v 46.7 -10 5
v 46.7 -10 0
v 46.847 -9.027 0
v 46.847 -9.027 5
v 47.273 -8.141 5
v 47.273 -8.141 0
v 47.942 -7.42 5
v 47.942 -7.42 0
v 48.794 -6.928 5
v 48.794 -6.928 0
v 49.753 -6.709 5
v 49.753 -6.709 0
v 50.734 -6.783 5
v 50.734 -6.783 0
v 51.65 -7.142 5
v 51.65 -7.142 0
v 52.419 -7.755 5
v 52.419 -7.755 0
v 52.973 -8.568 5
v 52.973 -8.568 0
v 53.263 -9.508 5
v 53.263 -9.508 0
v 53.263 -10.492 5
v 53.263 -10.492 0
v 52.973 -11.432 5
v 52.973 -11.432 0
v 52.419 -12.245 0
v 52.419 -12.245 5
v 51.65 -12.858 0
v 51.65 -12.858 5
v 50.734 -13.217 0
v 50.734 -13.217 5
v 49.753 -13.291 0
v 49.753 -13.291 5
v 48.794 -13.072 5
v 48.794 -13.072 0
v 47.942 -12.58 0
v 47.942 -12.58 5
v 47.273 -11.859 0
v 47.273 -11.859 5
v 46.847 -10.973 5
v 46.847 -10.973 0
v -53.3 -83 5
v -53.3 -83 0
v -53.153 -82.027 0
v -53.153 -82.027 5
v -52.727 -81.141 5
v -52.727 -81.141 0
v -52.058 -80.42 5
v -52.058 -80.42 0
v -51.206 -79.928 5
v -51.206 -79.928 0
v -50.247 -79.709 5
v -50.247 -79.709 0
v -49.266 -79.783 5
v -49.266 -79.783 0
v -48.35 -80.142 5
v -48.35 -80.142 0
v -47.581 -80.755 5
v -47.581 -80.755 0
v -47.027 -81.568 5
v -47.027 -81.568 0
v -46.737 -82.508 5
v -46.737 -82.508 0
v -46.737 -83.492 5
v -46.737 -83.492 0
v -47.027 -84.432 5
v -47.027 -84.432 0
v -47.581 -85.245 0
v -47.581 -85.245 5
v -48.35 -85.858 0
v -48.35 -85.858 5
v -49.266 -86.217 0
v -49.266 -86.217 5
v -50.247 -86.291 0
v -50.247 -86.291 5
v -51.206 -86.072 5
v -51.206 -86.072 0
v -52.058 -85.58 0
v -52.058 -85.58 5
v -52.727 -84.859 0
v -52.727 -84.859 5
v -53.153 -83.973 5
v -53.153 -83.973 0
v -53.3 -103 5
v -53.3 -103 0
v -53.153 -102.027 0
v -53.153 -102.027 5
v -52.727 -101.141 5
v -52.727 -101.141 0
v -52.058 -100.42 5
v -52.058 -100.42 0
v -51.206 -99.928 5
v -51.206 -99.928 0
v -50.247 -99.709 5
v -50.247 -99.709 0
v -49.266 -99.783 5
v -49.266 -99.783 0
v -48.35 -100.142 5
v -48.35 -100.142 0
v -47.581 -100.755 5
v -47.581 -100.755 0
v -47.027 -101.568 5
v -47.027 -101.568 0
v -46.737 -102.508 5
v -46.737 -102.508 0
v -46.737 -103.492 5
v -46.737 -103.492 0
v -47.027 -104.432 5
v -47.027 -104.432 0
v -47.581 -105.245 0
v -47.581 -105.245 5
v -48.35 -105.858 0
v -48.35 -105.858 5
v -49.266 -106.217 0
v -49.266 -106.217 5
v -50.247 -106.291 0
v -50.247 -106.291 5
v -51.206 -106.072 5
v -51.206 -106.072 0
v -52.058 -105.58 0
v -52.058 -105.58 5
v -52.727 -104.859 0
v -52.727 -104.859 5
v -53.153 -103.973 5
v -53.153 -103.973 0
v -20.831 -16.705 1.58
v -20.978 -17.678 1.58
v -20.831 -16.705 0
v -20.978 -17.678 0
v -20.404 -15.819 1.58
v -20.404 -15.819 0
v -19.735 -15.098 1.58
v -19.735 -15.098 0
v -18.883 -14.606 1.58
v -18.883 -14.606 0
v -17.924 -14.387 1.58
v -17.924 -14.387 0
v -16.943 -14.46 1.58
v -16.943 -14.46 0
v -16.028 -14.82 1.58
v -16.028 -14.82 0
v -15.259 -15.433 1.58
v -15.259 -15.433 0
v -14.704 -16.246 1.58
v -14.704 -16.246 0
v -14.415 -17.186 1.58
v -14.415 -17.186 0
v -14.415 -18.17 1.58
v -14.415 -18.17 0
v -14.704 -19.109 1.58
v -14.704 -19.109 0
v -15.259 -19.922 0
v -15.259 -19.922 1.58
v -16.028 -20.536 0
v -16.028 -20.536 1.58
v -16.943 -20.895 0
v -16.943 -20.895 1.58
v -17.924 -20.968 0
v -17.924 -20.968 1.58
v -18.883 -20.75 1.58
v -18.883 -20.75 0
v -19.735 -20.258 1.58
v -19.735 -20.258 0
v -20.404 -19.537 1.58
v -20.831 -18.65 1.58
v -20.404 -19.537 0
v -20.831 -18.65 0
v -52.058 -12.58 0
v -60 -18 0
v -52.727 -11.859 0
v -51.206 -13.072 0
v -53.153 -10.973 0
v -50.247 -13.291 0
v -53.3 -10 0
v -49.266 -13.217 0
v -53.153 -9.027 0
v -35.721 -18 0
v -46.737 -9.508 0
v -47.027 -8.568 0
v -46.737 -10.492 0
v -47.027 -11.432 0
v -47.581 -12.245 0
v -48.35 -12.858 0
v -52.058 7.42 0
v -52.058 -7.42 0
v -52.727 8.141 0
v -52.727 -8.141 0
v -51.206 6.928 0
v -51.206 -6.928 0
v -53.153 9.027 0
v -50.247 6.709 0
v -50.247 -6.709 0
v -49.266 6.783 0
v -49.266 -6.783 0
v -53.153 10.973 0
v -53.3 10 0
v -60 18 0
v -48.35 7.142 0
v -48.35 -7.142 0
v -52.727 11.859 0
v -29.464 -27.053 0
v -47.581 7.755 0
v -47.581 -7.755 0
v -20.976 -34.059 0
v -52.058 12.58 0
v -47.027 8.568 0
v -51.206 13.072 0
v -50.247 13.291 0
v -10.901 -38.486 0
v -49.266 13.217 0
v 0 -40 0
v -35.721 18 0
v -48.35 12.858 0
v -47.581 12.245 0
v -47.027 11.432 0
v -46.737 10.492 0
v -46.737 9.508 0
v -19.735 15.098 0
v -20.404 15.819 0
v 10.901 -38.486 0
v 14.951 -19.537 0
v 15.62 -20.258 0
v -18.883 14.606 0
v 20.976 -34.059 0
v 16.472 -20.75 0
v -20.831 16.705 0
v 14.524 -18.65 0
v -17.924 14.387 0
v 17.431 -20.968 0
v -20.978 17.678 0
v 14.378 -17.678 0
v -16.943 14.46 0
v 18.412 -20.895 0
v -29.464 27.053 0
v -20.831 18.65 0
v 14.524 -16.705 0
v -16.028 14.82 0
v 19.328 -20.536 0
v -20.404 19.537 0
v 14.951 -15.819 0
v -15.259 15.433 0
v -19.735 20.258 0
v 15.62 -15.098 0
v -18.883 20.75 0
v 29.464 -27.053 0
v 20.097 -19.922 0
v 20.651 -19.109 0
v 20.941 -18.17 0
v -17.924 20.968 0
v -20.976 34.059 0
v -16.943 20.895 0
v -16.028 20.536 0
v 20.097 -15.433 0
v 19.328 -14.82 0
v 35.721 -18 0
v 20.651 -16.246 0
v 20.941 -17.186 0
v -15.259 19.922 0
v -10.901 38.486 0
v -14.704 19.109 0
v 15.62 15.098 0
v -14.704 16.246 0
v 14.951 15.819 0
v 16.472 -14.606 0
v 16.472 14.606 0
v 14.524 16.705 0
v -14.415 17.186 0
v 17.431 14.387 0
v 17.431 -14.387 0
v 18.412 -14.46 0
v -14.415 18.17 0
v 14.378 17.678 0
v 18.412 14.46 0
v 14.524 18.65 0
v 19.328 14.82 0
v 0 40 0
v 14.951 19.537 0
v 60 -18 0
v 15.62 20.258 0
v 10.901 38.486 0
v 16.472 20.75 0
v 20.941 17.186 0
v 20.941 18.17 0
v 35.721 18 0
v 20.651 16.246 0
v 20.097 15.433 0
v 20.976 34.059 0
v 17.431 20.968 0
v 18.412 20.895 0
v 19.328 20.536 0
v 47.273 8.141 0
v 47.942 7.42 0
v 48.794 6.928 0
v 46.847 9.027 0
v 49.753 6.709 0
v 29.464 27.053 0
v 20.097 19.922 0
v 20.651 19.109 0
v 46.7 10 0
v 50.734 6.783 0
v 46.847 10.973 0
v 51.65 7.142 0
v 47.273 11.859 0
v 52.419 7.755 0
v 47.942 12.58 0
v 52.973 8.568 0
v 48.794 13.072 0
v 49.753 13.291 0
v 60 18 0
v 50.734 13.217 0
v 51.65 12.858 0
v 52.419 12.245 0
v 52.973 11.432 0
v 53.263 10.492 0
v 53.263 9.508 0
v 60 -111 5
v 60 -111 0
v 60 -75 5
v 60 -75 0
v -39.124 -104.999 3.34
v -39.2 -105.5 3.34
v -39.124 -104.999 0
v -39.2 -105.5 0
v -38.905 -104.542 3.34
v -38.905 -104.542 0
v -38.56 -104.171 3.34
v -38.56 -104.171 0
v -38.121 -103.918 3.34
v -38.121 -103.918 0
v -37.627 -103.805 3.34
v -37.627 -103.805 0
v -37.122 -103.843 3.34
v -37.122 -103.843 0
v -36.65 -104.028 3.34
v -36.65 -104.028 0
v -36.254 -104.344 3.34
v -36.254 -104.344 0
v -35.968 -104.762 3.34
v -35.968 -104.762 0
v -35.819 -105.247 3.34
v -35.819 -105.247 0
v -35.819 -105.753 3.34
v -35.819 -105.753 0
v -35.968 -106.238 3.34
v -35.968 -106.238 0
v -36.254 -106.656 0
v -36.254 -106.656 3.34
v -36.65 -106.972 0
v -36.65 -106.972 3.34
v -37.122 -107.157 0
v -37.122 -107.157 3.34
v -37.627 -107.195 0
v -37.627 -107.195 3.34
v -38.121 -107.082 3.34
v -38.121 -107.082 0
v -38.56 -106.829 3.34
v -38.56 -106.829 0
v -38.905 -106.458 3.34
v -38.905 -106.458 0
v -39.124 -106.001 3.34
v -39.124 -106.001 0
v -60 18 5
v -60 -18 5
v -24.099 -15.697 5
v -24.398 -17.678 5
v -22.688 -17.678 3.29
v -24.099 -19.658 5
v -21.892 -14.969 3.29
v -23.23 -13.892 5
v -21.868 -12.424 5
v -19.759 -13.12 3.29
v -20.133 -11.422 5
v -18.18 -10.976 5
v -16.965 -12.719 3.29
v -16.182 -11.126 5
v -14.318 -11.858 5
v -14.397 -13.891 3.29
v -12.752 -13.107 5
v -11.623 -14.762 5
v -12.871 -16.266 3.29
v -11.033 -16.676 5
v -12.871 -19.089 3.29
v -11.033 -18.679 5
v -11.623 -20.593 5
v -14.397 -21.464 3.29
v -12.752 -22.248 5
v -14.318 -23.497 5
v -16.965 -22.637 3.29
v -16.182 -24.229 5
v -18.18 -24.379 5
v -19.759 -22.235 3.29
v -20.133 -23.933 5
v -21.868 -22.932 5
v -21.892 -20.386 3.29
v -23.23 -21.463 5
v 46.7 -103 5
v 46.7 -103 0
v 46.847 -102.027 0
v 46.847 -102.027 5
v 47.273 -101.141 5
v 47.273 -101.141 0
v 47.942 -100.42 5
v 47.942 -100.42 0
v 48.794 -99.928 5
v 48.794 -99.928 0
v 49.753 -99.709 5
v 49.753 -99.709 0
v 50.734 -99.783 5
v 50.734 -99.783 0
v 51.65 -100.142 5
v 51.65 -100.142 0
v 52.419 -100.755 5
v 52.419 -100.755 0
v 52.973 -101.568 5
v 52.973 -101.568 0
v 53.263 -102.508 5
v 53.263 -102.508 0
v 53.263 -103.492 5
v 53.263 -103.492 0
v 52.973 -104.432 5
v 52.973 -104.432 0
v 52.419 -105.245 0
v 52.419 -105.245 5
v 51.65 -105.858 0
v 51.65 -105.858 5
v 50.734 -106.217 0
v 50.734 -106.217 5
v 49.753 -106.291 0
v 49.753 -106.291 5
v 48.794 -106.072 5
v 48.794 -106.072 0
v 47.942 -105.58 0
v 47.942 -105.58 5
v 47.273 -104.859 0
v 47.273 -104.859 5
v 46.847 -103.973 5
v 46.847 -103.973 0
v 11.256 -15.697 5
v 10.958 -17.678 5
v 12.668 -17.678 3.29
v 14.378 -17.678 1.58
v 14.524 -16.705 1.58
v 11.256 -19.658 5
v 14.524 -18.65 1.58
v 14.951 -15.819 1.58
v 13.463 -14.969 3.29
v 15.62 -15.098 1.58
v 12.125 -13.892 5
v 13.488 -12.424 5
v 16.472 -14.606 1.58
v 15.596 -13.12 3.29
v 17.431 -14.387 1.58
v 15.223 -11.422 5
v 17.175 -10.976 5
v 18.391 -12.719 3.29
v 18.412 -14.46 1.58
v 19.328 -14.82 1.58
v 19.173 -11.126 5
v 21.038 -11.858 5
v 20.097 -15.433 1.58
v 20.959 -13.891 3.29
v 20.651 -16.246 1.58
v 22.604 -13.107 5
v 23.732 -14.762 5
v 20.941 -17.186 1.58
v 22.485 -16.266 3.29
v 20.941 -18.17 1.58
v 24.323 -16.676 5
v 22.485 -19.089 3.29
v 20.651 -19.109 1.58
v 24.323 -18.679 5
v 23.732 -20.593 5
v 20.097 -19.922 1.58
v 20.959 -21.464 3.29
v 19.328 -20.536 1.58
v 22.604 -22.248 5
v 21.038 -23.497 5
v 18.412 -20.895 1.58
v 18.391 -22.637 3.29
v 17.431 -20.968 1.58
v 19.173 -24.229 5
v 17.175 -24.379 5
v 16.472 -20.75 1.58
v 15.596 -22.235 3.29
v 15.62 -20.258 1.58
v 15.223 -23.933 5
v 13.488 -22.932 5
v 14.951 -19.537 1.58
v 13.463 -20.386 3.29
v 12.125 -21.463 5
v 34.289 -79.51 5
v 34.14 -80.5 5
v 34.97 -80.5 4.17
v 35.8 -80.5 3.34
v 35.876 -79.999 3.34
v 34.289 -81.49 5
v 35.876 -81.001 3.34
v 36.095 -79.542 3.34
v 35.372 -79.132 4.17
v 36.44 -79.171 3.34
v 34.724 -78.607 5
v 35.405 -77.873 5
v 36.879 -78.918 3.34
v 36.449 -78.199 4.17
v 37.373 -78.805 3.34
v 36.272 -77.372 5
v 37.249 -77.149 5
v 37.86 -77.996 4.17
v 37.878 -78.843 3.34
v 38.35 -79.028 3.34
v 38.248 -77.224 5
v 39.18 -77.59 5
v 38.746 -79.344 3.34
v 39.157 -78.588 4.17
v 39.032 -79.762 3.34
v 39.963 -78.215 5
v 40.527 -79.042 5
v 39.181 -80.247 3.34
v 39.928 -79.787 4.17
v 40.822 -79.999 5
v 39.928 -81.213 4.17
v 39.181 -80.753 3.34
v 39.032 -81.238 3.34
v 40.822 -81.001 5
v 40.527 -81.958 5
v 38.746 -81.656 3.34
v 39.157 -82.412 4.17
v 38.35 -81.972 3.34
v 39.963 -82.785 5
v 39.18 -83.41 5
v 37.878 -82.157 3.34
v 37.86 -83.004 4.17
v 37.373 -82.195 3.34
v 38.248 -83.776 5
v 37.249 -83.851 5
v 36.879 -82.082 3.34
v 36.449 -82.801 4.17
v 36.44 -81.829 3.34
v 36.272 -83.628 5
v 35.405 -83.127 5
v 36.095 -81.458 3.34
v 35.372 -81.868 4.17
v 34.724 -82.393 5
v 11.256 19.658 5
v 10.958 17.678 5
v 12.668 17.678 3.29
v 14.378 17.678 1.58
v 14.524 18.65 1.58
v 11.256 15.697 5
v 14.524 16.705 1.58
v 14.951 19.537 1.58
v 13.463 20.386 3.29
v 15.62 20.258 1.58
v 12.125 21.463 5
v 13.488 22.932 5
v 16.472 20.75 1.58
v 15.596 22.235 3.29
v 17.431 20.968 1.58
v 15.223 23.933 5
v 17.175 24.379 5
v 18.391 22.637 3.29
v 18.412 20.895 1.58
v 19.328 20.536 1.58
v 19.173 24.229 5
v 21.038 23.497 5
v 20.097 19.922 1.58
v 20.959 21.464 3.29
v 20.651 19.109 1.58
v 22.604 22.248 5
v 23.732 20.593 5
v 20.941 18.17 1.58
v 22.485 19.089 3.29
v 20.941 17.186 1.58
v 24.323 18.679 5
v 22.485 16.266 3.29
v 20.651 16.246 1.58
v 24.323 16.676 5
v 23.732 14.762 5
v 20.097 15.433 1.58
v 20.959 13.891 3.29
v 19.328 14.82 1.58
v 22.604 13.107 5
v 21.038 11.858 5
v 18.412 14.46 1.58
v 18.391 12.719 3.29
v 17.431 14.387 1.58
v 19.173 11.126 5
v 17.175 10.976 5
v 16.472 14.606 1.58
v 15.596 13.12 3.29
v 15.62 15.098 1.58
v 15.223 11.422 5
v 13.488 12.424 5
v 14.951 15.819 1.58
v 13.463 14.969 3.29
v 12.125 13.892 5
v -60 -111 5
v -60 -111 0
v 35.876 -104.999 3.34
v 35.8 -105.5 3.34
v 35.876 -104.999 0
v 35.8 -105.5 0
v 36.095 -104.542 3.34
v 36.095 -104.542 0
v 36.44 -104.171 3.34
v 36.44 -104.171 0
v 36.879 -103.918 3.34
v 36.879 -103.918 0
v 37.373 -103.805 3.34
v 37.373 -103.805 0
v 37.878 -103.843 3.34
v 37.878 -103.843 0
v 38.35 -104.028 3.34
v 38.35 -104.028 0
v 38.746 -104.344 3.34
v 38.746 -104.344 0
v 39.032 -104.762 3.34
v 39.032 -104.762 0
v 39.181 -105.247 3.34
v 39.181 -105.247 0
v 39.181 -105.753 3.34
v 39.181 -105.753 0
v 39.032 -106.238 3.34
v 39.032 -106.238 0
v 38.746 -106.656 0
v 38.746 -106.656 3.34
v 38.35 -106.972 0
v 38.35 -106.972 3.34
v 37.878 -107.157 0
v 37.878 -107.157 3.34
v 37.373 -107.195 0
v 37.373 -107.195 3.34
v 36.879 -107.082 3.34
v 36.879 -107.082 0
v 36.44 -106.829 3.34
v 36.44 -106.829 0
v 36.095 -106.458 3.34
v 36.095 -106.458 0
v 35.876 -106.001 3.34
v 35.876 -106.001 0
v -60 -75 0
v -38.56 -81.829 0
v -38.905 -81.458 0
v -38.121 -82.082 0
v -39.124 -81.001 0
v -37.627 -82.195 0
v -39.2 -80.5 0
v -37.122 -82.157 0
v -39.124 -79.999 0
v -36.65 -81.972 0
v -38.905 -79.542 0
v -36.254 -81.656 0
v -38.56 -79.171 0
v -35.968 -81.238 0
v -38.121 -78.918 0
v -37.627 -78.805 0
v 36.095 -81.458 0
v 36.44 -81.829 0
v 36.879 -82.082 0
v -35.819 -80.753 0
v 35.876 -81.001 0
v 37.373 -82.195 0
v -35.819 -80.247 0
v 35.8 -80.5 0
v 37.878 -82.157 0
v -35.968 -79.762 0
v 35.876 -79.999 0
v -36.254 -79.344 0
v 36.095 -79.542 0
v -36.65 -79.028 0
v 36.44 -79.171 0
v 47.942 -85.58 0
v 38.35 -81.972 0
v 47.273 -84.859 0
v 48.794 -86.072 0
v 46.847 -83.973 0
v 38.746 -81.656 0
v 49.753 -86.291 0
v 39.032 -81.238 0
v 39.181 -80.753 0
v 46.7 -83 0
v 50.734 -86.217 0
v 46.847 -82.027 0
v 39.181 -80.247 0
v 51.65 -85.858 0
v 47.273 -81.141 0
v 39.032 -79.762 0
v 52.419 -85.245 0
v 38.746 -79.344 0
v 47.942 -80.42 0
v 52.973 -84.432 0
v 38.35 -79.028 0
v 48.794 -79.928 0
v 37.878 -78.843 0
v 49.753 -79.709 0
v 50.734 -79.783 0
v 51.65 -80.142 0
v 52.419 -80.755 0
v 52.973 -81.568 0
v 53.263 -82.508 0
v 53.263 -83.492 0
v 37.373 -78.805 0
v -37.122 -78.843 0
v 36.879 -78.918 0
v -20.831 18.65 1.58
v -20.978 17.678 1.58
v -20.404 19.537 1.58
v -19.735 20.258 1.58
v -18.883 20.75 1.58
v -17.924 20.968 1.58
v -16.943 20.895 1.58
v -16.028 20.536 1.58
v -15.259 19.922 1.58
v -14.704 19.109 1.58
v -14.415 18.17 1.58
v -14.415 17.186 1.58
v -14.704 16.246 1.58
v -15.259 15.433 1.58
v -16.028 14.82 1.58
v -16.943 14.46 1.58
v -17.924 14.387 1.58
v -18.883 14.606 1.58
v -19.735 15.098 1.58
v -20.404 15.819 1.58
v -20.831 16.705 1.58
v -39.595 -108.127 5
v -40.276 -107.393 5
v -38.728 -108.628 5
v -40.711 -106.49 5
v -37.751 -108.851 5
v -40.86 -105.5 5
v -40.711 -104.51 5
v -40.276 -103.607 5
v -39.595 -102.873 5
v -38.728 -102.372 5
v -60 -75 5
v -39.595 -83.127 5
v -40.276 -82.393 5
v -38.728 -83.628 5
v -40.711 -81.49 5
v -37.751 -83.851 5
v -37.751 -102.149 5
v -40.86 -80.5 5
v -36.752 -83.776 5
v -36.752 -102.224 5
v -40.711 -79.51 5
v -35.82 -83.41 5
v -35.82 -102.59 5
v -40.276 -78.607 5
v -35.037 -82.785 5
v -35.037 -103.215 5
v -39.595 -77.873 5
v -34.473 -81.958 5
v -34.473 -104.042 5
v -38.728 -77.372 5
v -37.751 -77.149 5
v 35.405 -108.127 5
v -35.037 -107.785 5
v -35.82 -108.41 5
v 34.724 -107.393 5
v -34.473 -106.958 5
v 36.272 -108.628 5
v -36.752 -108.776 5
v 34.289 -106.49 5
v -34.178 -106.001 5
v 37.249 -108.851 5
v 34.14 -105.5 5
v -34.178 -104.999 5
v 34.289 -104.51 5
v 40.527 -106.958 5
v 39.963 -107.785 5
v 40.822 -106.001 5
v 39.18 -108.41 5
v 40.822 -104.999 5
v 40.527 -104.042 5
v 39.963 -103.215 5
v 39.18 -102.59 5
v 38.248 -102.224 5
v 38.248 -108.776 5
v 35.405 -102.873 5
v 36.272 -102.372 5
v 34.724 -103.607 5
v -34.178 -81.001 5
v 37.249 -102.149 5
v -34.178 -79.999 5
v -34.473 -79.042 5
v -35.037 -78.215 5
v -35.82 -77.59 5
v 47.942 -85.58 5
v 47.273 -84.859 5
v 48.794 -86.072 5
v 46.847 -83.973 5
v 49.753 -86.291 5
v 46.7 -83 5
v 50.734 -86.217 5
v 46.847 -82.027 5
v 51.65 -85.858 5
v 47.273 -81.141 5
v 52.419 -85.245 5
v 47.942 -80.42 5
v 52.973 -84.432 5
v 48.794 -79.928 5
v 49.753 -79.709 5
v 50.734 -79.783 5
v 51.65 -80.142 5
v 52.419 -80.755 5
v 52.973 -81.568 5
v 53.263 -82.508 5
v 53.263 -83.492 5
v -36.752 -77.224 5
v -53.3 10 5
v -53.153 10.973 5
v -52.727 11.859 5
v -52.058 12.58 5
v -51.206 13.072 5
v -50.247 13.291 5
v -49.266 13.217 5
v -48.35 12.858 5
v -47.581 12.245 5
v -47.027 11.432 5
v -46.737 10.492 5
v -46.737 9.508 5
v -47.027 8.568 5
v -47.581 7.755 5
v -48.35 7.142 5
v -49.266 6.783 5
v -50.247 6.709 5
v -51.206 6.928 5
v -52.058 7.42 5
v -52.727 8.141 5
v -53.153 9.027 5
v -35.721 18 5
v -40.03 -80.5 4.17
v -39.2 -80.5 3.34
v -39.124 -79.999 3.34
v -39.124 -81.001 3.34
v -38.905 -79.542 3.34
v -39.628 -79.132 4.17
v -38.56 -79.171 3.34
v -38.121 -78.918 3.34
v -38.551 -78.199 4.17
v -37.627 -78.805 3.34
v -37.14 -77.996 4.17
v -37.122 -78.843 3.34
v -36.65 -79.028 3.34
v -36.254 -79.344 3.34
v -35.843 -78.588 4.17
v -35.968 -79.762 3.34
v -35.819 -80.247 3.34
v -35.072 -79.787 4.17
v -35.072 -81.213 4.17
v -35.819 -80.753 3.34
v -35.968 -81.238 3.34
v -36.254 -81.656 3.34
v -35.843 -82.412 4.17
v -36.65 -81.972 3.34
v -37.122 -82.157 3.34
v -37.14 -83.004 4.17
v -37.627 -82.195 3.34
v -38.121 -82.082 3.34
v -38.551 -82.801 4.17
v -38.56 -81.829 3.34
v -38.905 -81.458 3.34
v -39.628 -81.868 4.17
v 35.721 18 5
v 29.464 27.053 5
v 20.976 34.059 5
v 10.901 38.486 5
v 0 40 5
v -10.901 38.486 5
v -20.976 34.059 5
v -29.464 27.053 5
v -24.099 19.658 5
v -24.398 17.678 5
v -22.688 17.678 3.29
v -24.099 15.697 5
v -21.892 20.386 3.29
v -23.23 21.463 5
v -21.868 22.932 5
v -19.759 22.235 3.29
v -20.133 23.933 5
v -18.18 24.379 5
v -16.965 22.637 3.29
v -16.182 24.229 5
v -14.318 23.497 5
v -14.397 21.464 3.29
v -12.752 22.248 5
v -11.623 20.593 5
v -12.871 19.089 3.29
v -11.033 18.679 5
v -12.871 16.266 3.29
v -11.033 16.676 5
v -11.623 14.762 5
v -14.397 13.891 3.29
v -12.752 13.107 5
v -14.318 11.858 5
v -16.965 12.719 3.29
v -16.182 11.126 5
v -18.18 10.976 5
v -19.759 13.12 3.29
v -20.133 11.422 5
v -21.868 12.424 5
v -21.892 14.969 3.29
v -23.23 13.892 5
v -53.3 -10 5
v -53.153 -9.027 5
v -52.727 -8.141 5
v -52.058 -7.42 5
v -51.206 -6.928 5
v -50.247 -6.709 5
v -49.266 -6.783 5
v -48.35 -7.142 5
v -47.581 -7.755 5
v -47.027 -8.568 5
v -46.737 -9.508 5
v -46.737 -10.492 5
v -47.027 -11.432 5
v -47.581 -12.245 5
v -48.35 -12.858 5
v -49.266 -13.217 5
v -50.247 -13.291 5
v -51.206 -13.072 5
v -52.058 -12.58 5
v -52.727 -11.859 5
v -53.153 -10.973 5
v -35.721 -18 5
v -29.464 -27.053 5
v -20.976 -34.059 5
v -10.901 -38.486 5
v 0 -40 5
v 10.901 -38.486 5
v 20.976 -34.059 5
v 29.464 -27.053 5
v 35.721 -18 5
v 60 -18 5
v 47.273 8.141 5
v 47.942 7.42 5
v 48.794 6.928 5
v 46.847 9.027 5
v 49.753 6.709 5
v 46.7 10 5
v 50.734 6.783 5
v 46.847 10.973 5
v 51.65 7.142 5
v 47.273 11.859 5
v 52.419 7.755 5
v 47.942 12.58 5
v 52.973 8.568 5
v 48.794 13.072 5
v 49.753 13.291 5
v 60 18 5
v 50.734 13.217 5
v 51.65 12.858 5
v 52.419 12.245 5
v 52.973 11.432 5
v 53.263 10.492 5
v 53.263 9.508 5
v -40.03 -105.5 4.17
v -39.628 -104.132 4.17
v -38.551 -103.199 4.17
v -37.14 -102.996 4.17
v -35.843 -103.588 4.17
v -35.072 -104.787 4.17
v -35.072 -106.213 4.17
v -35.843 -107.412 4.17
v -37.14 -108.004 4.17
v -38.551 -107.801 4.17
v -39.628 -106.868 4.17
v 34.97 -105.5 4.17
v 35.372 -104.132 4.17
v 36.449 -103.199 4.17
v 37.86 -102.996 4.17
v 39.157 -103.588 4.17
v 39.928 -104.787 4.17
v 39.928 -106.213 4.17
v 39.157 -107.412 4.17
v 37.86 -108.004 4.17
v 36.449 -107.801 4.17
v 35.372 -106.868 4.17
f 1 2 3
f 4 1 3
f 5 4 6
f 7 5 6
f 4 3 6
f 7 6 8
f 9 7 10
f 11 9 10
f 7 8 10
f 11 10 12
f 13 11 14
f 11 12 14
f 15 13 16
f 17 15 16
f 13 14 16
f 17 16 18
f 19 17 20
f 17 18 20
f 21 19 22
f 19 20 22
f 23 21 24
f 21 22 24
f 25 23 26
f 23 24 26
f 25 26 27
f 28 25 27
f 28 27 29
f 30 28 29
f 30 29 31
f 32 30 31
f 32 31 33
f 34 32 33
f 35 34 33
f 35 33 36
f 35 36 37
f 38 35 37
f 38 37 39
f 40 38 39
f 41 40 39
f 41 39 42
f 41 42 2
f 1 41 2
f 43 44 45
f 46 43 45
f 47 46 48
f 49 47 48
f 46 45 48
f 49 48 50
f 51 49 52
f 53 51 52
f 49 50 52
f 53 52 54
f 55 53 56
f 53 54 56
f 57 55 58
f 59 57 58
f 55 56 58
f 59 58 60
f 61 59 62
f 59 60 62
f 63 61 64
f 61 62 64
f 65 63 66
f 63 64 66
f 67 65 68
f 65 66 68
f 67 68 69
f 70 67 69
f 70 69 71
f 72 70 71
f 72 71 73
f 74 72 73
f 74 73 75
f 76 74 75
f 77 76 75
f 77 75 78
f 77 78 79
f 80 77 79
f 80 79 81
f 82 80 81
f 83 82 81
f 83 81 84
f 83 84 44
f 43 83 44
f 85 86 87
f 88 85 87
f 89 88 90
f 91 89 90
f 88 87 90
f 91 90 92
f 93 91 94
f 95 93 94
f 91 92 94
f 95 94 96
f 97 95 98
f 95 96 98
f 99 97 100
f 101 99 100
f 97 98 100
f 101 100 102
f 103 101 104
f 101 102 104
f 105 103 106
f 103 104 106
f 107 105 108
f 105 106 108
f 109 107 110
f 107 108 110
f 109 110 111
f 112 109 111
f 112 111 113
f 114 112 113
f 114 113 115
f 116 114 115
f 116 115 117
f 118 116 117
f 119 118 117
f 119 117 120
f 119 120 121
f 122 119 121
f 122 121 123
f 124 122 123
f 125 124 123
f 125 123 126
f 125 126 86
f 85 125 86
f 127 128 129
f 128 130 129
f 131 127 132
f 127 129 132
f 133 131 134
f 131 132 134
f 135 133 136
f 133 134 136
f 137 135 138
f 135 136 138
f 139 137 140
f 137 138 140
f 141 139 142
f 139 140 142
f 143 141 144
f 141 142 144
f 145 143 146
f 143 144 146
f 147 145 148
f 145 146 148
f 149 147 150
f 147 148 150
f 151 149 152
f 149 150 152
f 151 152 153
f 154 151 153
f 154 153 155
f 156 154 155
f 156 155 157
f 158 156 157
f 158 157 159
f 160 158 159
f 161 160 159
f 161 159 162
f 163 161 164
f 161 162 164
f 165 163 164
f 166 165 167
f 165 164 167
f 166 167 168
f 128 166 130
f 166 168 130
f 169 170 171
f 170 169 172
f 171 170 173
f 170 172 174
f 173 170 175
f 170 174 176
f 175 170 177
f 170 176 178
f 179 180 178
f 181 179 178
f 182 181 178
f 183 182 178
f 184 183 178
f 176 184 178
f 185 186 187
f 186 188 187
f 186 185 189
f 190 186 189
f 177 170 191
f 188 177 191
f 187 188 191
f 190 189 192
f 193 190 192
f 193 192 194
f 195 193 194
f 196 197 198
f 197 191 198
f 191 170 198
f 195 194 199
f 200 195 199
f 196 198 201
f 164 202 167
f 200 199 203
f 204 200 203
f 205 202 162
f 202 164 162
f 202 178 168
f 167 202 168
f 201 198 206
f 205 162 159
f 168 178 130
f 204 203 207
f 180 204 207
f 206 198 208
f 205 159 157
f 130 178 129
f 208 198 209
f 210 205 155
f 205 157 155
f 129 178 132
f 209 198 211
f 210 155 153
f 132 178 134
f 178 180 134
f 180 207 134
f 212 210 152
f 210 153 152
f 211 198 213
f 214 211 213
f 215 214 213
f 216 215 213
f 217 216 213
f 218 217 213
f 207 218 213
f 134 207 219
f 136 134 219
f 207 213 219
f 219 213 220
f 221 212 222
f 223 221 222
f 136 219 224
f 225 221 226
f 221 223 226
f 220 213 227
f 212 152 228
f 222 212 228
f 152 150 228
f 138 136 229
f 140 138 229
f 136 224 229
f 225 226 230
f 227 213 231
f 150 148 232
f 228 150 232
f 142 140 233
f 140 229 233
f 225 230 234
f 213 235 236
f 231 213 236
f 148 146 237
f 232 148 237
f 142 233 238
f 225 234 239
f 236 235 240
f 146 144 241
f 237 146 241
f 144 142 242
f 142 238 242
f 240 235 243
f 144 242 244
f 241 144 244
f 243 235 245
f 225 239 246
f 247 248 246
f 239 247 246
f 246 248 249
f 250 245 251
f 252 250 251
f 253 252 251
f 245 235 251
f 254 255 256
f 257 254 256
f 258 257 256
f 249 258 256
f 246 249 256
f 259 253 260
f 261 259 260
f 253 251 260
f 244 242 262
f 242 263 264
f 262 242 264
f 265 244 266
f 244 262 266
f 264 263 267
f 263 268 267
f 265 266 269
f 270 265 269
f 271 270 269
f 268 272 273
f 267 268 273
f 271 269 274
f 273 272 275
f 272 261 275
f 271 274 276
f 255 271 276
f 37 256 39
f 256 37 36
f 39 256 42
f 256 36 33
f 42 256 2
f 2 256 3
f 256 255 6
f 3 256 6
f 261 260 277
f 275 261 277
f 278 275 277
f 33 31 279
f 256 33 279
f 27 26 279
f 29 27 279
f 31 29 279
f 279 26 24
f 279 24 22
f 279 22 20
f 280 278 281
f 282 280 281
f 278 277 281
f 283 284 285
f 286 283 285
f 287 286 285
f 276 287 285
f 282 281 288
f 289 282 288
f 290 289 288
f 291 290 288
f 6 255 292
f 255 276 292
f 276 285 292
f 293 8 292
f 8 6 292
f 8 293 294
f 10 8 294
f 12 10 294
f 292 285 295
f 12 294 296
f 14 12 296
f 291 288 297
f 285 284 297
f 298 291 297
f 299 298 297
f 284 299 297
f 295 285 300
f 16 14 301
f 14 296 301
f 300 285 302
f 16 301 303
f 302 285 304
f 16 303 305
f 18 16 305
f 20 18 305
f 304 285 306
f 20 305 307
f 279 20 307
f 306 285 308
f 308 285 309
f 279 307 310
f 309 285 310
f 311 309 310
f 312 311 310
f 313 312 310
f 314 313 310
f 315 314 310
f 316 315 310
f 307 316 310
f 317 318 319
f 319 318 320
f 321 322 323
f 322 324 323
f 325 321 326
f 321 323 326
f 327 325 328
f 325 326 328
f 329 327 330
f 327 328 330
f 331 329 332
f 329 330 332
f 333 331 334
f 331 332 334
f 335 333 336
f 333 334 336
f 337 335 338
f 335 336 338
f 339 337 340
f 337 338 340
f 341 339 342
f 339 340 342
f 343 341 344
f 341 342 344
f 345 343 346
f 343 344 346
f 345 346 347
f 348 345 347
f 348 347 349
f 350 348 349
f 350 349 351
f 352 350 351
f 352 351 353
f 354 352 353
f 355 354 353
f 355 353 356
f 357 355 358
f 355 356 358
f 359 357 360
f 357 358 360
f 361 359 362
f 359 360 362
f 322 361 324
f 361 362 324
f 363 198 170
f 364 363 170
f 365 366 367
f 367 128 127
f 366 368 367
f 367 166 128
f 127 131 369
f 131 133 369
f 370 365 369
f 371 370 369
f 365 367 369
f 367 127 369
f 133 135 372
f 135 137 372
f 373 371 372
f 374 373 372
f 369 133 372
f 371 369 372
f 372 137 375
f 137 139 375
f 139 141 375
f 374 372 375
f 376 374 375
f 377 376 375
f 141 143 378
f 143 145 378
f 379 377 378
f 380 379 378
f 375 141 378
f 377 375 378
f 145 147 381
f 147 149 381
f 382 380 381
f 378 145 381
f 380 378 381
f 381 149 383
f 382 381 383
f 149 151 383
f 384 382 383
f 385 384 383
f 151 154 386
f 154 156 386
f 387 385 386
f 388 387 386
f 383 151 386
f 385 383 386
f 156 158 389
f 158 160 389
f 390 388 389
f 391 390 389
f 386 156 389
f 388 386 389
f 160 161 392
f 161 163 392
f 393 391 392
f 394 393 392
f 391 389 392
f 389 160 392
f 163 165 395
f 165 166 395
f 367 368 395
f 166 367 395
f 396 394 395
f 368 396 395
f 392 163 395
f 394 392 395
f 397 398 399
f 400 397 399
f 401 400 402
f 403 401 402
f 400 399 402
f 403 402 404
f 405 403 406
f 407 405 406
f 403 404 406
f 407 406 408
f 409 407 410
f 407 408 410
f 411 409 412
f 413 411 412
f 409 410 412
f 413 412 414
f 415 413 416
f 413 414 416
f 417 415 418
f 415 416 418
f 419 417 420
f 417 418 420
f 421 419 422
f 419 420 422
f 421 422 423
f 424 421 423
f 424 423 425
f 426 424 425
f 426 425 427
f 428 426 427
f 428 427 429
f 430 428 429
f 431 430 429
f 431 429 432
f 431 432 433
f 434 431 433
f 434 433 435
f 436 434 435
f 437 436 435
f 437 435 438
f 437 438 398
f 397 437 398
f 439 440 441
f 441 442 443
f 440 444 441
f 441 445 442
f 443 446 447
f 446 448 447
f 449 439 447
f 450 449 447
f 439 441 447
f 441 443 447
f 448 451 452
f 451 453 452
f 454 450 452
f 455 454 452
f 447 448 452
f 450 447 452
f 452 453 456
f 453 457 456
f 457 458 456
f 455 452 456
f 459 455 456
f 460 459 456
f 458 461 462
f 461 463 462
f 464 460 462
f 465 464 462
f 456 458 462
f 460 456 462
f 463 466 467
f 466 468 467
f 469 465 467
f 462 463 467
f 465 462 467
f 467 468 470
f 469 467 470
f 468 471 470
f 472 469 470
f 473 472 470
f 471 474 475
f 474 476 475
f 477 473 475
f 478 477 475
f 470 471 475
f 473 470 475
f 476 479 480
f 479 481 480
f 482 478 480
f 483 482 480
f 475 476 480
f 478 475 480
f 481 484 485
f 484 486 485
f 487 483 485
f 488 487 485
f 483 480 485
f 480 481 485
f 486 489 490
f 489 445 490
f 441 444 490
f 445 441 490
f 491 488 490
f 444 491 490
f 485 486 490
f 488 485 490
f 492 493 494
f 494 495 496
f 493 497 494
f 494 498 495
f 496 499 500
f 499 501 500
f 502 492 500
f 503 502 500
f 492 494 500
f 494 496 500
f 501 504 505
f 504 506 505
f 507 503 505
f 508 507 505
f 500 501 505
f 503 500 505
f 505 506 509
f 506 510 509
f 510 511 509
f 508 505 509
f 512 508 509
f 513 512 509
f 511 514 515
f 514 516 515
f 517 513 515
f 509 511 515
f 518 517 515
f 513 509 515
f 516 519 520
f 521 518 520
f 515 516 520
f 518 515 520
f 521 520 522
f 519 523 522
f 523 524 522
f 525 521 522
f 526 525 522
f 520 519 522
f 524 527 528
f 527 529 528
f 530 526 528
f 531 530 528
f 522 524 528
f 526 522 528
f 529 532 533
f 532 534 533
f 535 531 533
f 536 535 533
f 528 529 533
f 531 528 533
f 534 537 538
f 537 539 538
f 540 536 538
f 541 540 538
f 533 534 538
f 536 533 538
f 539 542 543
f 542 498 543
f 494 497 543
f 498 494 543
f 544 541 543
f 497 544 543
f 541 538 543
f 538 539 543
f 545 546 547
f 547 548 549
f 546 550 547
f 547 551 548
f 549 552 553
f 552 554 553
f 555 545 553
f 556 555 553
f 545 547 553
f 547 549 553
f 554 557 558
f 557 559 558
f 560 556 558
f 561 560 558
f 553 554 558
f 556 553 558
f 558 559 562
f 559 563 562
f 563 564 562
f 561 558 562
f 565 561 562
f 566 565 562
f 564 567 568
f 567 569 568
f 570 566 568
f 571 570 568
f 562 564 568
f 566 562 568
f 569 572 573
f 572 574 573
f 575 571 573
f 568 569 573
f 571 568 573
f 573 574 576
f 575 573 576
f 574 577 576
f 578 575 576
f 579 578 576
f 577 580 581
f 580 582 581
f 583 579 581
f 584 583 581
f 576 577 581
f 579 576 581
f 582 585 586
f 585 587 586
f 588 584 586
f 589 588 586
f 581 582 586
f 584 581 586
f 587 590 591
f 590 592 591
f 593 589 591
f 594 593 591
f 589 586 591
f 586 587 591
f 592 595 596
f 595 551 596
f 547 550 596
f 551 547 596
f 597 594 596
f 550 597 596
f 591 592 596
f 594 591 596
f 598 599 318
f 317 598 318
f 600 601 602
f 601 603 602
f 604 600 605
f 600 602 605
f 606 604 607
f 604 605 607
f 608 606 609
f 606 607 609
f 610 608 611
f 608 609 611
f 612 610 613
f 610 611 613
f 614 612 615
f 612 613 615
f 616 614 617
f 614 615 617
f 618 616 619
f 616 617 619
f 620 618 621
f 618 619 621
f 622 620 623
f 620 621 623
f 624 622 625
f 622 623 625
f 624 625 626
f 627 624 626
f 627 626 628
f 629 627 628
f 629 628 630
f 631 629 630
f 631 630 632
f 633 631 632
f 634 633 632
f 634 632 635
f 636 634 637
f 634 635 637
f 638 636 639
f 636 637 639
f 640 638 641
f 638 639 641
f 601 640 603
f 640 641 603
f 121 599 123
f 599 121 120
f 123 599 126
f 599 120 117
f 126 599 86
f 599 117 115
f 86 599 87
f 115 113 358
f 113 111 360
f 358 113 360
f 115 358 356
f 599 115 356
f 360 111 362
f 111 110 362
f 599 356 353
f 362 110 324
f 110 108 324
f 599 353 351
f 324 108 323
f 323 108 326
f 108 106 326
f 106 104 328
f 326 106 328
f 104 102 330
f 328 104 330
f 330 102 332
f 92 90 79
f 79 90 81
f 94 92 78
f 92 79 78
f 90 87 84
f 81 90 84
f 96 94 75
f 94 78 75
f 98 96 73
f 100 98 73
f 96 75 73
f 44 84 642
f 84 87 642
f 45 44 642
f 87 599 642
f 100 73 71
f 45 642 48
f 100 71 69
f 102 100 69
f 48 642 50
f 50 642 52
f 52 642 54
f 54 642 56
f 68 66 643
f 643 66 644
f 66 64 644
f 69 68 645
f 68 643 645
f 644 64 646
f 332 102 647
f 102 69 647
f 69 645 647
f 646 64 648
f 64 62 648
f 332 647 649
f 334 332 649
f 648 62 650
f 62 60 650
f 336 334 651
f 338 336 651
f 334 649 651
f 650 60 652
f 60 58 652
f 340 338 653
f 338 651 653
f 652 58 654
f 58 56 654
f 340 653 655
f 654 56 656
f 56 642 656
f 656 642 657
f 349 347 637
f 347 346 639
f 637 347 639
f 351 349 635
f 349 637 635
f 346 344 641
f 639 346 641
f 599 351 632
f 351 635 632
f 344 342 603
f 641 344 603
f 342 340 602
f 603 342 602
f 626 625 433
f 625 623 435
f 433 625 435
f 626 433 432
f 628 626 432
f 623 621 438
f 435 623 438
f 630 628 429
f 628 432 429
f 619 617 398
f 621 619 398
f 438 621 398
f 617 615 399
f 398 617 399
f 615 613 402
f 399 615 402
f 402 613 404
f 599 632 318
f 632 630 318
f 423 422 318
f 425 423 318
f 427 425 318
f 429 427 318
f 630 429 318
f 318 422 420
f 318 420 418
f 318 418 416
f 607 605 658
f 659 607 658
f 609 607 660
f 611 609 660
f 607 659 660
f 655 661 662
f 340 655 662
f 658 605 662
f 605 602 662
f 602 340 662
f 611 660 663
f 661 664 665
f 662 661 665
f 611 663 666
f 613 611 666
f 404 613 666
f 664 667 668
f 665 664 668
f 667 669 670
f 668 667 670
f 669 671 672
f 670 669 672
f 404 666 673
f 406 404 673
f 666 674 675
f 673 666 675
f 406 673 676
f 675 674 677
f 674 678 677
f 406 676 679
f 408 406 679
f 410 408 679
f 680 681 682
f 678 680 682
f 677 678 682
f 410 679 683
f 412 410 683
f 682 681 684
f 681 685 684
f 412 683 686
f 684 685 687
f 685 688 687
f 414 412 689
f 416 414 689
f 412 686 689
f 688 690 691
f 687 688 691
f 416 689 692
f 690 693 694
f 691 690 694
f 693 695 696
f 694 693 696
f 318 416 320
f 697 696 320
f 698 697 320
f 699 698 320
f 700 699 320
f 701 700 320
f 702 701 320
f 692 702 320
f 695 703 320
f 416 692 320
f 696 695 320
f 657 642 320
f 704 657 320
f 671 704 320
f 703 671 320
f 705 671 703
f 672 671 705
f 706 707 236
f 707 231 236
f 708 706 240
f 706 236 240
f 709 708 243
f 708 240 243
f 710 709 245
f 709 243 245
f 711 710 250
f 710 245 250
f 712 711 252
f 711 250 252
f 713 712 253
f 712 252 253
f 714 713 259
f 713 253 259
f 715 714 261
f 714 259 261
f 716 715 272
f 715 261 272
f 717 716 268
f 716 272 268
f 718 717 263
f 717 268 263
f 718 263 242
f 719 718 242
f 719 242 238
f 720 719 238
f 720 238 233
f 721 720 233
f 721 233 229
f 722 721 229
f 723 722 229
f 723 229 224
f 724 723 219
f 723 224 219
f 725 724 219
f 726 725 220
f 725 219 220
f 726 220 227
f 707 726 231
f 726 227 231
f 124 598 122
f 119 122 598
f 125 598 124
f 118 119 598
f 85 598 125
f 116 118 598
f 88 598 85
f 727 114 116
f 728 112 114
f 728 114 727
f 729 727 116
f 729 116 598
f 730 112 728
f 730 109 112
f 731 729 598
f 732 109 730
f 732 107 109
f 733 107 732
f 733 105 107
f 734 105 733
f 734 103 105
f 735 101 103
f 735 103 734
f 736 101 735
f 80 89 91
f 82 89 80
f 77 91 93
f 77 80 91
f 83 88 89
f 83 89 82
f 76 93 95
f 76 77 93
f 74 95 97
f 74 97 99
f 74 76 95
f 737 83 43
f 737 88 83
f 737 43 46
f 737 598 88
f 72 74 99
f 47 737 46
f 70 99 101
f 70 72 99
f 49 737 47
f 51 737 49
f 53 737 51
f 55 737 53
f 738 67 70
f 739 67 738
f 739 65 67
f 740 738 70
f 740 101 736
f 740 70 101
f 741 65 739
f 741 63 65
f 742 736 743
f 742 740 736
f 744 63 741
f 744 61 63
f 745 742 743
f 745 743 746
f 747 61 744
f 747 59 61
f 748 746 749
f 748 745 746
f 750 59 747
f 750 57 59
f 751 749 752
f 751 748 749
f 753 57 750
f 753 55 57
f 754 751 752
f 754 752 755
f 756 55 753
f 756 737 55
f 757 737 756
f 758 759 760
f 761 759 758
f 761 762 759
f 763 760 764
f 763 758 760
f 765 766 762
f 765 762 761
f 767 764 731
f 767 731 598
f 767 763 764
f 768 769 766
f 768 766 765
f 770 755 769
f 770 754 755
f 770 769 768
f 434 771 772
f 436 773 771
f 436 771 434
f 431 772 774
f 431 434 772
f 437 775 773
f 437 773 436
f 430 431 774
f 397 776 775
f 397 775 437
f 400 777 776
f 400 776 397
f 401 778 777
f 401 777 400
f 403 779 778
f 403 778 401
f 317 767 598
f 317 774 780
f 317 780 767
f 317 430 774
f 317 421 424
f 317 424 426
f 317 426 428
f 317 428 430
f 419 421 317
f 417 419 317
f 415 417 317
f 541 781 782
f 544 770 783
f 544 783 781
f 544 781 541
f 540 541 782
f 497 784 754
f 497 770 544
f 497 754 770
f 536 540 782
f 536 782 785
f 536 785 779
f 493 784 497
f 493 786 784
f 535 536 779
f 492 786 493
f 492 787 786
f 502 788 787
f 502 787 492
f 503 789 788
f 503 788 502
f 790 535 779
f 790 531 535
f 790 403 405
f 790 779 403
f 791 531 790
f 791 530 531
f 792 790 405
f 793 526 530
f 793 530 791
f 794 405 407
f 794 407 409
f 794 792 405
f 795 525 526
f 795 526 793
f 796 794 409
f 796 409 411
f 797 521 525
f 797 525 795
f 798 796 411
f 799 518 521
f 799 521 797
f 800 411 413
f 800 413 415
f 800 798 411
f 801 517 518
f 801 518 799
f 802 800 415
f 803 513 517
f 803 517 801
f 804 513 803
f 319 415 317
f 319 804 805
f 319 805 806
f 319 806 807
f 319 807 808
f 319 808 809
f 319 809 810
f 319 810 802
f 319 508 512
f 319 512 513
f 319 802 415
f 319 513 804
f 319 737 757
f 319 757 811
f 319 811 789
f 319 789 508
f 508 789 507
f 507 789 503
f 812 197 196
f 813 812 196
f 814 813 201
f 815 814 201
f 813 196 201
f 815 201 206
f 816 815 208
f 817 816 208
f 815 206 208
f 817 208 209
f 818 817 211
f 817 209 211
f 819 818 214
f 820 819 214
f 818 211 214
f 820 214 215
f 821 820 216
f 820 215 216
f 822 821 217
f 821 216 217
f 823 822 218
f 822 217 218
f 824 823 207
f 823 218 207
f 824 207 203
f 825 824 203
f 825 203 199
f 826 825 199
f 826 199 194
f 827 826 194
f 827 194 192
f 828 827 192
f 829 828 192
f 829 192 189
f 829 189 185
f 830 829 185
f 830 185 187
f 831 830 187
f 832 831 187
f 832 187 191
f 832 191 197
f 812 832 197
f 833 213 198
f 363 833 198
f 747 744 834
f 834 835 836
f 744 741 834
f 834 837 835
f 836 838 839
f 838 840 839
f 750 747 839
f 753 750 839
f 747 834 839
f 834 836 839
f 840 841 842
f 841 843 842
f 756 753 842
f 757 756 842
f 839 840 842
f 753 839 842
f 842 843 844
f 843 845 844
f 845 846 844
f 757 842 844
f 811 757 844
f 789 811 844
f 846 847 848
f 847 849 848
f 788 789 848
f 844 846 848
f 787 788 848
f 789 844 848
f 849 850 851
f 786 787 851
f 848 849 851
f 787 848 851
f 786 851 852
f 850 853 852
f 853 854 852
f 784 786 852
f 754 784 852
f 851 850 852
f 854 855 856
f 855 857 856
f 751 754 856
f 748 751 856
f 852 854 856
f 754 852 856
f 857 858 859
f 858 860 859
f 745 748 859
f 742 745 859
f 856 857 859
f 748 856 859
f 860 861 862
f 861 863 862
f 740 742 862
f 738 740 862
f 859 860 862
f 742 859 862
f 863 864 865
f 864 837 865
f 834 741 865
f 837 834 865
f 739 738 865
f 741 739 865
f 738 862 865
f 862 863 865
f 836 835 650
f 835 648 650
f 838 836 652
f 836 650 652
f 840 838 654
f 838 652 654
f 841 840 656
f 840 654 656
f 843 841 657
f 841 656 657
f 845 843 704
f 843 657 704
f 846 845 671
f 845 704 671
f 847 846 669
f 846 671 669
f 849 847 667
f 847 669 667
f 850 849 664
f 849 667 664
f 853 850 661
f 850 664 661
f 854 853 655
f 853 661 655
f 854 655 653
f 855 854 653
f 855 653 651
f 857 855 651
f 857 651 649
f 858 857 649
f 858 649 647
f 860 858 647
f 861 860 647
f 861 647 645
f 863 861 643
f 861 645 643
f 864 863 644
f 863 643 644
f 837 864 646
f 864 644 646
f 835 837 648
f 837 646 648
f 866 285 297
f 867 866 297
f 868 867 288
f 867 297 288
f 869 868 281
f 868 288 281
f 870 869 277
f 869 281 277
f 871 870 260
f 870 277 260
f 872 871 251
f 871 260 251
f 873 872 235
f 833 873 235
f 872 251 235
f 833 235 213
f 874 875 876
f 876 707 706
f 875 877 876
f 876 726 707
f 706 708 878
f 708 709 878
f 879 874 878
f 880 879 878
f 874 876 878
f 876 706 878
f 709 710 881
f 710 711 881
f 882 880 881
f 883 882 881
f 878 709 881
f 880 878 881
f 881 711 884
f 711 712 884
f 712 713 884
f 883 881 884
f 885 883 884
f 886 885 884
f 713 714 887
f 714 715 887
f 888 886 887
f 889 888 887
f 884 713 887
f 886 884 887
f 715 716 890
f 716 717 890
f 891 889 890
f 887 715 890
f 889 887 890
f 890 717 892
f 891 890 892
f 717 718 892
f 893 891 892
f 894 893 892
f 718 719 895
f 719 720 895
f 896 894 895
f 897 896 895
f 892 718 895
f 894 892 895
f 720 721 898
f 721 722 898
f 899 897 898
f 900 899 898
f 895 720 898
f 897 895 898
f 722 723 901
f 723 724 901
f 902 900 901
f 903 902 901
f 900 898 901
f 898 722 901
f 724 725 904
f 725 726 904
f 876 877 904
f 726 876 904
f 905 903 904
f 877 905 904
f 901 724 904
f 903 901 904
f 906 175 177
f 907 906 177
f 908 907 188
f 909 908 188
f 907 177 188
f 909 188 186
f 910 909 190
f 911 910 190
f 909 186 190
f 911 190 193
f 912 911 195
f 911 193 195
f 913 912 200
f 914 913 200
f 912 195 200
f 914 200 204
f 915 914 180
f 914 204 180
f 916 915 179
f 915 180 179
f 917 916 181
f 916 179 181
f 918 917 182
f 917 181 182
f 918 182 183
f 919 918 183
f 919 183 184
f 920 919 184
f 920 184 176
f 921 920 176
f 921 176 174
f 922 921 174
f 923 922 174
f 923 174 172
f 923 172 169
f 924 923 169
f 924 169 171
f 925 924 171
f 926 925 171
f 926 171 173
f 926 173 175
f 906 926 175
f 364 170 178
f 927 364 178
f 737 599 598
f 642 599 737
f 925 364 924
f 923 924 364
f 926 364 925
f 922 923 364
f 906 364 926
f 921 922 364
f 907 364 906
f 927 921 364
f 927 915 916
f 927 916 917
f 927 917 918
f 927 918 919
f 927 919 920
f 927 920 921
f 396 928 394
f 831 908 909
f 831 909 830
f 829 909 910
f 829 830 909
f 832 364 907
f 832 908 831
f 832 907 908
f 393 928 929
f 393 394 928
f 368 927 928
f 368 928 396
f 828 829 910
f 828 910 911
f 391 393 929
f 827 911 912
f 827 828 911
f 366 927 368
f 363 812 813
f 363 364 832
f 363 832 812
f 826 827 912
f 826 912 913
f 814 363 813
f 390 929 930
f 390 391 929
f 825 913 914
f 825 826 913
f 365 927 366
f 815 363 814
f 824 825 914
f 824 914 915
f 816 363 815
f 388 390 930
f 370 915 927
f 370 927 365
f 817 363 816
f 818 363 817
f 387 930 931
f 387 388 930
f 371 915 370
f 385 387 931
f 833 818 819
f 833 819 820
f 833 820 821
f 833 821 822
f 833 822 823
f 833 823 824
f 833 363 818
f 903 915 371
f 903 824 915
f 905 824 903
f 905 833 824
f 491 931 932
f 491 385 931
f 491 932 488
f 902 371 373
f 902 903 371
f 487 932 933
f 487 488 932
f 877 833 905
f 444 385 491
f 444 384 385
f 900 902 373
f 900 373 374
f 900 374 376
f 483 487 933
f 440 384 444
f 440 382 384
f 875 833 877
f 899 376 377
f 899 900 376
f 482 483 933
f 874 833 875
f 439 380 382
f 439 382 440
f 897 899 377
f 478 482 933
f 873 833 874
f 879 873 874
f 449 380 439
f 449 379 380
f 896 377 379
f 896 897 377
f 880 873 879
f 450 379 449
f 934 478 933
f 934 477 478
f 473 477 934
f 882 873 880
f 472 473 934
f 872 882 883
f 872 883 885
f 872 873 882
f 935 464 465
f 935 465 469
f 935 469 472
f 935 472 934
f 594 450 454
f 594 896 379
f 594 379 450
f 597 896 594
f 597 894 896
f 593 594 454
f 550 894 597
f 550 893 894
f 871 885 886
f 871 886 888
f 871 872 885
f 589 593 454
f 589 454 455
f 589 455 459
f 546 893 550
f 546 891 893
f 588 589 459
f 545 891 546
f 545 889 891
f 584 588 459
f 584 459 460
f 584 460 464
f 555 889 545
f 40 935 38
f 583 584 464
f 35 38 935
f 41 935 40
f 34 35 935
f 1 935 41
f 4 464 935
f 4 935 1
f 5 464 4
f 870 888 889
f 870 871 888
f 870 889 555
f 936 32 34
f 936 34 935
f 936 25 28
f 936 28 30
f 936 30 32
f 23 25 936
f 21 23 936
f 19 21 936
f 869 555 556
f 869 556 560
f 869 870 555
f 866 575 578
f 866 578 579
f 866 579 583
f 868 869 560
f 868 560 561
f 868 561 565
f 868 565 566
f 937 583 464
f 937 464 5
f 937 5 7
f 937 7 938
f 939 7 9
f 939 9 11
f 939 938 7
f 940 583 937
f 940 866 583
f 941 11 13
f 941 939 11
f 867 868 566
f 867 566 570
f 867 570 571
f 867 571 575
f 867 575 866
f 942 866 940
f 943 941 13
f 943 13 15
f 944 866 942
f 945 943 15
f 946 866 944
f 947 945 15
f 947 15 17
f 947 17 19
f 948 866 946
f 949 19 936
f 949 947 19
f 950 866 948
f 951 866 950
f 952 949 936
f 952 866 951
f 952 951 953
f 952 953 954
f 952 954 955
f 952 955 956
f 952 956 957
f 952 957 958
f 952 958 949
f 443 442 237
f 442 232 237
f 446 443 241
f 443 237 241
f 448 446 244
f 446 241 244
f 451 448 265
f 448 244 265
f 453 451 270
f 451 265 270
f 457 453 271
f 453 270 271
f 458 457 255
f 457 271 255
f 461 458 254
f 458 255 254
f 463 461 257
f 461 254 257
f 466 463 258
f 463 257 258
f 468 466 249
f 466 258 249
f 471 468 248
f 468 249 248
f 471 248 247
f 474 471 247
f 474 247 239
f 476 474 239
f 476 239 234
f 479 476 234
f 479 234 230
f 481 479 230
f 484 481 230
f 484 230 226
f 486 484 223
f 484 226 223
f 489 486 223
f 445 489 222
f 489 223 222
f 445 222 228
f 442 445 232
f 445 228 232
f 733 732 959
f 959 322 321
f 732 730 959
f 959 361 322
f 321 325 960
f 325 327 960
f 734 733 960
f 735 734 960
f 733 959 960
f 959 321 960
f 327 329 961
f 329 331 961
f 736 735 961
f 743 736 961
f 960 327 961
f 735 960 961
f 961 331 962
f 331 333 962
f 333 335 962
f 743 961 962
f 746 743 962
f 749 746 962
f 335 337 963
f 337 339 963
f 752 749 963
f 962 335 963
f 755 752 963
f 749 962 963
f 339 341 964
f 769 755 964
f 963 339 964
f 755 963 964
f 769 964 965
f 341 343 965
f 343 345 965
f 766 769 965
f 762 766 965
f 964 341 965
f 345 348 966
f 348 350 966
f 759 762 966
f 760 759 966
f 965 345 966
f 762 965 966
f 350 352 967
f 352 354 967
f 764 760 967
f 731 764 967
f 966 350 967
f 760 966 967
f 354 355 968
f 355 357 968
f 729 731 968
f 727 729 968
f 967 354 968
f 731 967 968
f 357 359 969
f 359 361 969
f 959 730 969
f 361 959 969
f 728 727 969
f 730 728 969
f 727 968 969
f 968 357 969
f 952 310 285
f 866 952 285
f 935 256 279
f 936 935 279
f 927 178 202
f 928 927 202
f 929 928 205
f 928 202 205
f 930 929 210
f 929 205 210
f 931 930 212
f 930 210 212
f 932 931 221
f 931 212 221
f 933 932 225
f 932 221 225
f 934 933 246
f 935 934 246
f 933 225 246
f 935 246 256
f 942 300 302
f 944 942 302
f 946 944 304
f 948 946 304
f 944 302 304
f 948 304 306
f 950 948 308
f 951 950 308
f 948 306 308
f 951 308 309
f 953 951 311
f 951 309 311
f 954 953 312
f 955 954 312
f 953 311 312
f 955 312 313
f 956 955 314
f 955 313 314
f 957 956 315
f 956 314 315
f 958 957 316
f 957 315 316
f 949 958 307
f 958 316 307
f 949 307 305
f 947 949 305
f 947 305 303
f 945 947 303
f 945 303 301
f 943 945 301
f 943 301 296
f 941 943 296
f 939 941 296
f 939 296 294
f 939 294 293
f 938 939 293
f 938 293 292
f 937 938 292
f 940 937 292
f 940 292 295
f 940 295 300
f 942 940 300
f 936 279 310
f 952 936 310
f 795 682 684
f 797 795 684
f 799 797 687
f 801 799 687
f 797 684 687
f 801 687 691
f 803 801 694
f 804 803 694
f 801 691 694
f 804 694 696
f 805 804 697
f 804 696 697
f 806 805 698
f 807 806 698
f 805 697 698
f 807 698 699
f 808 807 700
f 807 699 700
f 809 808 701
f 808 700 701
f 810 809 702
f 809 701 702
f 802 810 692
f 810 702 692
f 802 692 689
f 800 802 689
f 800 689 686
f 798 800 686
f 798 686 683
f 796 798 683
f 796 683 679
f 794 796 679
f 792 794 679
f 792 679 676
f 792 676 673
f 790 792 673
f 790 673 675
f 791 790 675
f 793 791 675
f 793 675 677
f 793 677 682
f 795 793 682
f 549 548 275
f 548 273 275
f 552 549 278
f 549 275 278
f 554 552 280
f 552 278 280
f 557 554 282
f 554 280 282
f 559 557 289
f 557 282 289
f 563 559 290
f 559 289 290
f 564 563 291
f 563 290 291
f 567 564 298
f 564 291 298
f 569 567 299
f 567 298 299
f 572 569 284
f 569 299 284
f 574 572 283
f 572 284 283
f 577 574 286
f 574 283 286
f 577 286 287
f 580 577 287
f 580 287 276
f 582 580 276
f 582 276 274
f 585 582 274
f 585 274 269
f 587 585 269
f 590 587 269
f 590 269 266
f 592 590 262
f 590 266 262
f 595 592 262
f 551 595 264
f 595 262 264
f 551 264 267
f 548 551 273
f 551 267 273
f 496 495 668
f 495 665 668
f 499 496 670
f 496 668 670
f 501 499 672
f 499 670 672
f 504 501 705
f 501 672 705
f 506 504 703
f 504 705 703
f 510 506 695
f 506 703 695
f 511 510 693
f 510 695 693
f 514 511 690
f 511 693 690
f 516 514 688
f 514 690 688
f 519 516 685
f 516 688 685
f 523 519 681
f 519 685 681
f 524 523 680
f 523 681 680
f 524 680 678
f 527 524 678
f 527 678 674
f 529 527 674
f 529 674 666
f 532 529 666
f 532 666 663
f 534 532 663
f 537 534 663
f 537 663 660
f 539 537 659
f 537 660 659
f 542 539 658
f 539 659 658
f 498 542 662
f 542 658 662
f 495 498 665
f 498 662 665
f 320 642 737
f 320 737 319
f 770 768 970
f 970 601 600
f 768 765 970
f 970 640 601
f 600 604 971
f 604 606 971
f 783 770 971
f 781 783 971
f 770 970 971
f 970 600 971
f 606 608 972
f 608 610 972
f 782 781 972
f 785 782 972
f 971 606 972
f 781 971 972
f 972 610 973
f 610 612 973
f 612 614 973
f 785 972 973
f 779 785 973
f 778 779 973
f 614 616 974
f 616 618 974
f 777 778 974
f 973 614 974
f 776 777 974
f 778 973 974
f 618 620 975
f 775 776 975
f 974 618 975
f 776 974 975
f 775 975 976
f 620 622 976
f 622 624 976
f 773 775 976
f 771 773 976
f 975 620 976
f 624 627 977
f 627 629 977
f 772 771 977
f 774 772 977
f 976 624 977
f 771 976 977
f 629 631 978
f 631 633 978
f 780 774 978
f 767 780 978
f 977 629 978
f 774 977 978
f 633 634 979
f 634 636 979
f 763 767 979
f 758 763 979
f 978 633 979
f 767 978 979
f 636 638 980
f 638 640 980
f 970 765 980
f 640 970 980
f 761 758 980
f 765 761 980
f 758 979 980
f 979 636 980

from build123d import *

# Parameters (mm, degrees)
F1_DEPTH       = 5
F3_D           = 6.6
F3_CSINK_D     = 13.44
F3_CSINK_ANGLE = 90
F5_D           = 6.6
F6_W           = 120
F6_H           = 36
F7_DEPTH       = 5
F9_D           = 3.4
F9_CSINK_D     = 6.72
F9_CSINK_ANGLE = 90
F11_D          = 6.6


with BuildPart() as f1:
    # F0 (on Top) → F1 (new body)
    with BuildSketch(Plane.XY):
        with BuildLine():
            Line((-60, 18), (-60, 0))
            Line((-60, 0), (-60, -18))
            Line((-60, -18), (-35.721142199, -18))
            ThreePointArc((-35.721142199, -18), (0, -40), (35.721142199, -18))
            Line((35.721142199, -18), (60, -18))
            Line((60, -18), (60, 0))
            Line((60, 0), (60, 18))
            Line((60, 18), (35.721142199, 18))
            ThreePointArc((35.721142199, 18), (0, 40), (-35.721142199, 18))
            Line((-35.721142199, 18), (-60, 18))
        make_face()
    extrude(amount=F1_DEPTH)

    # F3 (through all)
    with Locations(Plane.XY.offset(5)):
        with Locations((-17.6776695297, 17.6776695297), (17.6776695297, 17.6776695297), (17.6776695297, -17.6776695297), (-17.6776695297, -17.6776695297)):
            CounterSinkHole(F3_D / 2, F3_CSINK_D / 2, counter_sink_angle=F3_CSINK_ANGLE)

    # F5 (through all)
    with Locations(Plane.XY.offset(5)):
        with Locations((-50, 10), (-50, -10), (50, -10), (50, 10)):
            Hole(F5_D / 2)


with BuildPart() as f7:
    # F6 (on Top) → F7 (new body)
    with BuildSketch(Plane.XY):
        with Locations((0, -93)):
            Rectangle(F6_W, F6_H)
    extrude(amount=F7_DEPTH)

    # F9 (through all)
    with Locations(Plane.XY.offset(5)):
        with Locations((-37.5, -80.5), (37.5, -80.5), (37.5, -105.5), (-37.5, -105.5)):
            CounterSinkHole(F9_D / 2, F9_CSINK_D / 2, counter_sink_angle=F9_CSINK_ANGLE)

    # F11 (through all)
    with Locations(Plane.XY.offset(5)):
        with Locations((-50, -83), (-50, -103), (50, -83), (50, -103)):
            Hole(F11_D / 2)


solid = Compound([f1.part, f7.part])
